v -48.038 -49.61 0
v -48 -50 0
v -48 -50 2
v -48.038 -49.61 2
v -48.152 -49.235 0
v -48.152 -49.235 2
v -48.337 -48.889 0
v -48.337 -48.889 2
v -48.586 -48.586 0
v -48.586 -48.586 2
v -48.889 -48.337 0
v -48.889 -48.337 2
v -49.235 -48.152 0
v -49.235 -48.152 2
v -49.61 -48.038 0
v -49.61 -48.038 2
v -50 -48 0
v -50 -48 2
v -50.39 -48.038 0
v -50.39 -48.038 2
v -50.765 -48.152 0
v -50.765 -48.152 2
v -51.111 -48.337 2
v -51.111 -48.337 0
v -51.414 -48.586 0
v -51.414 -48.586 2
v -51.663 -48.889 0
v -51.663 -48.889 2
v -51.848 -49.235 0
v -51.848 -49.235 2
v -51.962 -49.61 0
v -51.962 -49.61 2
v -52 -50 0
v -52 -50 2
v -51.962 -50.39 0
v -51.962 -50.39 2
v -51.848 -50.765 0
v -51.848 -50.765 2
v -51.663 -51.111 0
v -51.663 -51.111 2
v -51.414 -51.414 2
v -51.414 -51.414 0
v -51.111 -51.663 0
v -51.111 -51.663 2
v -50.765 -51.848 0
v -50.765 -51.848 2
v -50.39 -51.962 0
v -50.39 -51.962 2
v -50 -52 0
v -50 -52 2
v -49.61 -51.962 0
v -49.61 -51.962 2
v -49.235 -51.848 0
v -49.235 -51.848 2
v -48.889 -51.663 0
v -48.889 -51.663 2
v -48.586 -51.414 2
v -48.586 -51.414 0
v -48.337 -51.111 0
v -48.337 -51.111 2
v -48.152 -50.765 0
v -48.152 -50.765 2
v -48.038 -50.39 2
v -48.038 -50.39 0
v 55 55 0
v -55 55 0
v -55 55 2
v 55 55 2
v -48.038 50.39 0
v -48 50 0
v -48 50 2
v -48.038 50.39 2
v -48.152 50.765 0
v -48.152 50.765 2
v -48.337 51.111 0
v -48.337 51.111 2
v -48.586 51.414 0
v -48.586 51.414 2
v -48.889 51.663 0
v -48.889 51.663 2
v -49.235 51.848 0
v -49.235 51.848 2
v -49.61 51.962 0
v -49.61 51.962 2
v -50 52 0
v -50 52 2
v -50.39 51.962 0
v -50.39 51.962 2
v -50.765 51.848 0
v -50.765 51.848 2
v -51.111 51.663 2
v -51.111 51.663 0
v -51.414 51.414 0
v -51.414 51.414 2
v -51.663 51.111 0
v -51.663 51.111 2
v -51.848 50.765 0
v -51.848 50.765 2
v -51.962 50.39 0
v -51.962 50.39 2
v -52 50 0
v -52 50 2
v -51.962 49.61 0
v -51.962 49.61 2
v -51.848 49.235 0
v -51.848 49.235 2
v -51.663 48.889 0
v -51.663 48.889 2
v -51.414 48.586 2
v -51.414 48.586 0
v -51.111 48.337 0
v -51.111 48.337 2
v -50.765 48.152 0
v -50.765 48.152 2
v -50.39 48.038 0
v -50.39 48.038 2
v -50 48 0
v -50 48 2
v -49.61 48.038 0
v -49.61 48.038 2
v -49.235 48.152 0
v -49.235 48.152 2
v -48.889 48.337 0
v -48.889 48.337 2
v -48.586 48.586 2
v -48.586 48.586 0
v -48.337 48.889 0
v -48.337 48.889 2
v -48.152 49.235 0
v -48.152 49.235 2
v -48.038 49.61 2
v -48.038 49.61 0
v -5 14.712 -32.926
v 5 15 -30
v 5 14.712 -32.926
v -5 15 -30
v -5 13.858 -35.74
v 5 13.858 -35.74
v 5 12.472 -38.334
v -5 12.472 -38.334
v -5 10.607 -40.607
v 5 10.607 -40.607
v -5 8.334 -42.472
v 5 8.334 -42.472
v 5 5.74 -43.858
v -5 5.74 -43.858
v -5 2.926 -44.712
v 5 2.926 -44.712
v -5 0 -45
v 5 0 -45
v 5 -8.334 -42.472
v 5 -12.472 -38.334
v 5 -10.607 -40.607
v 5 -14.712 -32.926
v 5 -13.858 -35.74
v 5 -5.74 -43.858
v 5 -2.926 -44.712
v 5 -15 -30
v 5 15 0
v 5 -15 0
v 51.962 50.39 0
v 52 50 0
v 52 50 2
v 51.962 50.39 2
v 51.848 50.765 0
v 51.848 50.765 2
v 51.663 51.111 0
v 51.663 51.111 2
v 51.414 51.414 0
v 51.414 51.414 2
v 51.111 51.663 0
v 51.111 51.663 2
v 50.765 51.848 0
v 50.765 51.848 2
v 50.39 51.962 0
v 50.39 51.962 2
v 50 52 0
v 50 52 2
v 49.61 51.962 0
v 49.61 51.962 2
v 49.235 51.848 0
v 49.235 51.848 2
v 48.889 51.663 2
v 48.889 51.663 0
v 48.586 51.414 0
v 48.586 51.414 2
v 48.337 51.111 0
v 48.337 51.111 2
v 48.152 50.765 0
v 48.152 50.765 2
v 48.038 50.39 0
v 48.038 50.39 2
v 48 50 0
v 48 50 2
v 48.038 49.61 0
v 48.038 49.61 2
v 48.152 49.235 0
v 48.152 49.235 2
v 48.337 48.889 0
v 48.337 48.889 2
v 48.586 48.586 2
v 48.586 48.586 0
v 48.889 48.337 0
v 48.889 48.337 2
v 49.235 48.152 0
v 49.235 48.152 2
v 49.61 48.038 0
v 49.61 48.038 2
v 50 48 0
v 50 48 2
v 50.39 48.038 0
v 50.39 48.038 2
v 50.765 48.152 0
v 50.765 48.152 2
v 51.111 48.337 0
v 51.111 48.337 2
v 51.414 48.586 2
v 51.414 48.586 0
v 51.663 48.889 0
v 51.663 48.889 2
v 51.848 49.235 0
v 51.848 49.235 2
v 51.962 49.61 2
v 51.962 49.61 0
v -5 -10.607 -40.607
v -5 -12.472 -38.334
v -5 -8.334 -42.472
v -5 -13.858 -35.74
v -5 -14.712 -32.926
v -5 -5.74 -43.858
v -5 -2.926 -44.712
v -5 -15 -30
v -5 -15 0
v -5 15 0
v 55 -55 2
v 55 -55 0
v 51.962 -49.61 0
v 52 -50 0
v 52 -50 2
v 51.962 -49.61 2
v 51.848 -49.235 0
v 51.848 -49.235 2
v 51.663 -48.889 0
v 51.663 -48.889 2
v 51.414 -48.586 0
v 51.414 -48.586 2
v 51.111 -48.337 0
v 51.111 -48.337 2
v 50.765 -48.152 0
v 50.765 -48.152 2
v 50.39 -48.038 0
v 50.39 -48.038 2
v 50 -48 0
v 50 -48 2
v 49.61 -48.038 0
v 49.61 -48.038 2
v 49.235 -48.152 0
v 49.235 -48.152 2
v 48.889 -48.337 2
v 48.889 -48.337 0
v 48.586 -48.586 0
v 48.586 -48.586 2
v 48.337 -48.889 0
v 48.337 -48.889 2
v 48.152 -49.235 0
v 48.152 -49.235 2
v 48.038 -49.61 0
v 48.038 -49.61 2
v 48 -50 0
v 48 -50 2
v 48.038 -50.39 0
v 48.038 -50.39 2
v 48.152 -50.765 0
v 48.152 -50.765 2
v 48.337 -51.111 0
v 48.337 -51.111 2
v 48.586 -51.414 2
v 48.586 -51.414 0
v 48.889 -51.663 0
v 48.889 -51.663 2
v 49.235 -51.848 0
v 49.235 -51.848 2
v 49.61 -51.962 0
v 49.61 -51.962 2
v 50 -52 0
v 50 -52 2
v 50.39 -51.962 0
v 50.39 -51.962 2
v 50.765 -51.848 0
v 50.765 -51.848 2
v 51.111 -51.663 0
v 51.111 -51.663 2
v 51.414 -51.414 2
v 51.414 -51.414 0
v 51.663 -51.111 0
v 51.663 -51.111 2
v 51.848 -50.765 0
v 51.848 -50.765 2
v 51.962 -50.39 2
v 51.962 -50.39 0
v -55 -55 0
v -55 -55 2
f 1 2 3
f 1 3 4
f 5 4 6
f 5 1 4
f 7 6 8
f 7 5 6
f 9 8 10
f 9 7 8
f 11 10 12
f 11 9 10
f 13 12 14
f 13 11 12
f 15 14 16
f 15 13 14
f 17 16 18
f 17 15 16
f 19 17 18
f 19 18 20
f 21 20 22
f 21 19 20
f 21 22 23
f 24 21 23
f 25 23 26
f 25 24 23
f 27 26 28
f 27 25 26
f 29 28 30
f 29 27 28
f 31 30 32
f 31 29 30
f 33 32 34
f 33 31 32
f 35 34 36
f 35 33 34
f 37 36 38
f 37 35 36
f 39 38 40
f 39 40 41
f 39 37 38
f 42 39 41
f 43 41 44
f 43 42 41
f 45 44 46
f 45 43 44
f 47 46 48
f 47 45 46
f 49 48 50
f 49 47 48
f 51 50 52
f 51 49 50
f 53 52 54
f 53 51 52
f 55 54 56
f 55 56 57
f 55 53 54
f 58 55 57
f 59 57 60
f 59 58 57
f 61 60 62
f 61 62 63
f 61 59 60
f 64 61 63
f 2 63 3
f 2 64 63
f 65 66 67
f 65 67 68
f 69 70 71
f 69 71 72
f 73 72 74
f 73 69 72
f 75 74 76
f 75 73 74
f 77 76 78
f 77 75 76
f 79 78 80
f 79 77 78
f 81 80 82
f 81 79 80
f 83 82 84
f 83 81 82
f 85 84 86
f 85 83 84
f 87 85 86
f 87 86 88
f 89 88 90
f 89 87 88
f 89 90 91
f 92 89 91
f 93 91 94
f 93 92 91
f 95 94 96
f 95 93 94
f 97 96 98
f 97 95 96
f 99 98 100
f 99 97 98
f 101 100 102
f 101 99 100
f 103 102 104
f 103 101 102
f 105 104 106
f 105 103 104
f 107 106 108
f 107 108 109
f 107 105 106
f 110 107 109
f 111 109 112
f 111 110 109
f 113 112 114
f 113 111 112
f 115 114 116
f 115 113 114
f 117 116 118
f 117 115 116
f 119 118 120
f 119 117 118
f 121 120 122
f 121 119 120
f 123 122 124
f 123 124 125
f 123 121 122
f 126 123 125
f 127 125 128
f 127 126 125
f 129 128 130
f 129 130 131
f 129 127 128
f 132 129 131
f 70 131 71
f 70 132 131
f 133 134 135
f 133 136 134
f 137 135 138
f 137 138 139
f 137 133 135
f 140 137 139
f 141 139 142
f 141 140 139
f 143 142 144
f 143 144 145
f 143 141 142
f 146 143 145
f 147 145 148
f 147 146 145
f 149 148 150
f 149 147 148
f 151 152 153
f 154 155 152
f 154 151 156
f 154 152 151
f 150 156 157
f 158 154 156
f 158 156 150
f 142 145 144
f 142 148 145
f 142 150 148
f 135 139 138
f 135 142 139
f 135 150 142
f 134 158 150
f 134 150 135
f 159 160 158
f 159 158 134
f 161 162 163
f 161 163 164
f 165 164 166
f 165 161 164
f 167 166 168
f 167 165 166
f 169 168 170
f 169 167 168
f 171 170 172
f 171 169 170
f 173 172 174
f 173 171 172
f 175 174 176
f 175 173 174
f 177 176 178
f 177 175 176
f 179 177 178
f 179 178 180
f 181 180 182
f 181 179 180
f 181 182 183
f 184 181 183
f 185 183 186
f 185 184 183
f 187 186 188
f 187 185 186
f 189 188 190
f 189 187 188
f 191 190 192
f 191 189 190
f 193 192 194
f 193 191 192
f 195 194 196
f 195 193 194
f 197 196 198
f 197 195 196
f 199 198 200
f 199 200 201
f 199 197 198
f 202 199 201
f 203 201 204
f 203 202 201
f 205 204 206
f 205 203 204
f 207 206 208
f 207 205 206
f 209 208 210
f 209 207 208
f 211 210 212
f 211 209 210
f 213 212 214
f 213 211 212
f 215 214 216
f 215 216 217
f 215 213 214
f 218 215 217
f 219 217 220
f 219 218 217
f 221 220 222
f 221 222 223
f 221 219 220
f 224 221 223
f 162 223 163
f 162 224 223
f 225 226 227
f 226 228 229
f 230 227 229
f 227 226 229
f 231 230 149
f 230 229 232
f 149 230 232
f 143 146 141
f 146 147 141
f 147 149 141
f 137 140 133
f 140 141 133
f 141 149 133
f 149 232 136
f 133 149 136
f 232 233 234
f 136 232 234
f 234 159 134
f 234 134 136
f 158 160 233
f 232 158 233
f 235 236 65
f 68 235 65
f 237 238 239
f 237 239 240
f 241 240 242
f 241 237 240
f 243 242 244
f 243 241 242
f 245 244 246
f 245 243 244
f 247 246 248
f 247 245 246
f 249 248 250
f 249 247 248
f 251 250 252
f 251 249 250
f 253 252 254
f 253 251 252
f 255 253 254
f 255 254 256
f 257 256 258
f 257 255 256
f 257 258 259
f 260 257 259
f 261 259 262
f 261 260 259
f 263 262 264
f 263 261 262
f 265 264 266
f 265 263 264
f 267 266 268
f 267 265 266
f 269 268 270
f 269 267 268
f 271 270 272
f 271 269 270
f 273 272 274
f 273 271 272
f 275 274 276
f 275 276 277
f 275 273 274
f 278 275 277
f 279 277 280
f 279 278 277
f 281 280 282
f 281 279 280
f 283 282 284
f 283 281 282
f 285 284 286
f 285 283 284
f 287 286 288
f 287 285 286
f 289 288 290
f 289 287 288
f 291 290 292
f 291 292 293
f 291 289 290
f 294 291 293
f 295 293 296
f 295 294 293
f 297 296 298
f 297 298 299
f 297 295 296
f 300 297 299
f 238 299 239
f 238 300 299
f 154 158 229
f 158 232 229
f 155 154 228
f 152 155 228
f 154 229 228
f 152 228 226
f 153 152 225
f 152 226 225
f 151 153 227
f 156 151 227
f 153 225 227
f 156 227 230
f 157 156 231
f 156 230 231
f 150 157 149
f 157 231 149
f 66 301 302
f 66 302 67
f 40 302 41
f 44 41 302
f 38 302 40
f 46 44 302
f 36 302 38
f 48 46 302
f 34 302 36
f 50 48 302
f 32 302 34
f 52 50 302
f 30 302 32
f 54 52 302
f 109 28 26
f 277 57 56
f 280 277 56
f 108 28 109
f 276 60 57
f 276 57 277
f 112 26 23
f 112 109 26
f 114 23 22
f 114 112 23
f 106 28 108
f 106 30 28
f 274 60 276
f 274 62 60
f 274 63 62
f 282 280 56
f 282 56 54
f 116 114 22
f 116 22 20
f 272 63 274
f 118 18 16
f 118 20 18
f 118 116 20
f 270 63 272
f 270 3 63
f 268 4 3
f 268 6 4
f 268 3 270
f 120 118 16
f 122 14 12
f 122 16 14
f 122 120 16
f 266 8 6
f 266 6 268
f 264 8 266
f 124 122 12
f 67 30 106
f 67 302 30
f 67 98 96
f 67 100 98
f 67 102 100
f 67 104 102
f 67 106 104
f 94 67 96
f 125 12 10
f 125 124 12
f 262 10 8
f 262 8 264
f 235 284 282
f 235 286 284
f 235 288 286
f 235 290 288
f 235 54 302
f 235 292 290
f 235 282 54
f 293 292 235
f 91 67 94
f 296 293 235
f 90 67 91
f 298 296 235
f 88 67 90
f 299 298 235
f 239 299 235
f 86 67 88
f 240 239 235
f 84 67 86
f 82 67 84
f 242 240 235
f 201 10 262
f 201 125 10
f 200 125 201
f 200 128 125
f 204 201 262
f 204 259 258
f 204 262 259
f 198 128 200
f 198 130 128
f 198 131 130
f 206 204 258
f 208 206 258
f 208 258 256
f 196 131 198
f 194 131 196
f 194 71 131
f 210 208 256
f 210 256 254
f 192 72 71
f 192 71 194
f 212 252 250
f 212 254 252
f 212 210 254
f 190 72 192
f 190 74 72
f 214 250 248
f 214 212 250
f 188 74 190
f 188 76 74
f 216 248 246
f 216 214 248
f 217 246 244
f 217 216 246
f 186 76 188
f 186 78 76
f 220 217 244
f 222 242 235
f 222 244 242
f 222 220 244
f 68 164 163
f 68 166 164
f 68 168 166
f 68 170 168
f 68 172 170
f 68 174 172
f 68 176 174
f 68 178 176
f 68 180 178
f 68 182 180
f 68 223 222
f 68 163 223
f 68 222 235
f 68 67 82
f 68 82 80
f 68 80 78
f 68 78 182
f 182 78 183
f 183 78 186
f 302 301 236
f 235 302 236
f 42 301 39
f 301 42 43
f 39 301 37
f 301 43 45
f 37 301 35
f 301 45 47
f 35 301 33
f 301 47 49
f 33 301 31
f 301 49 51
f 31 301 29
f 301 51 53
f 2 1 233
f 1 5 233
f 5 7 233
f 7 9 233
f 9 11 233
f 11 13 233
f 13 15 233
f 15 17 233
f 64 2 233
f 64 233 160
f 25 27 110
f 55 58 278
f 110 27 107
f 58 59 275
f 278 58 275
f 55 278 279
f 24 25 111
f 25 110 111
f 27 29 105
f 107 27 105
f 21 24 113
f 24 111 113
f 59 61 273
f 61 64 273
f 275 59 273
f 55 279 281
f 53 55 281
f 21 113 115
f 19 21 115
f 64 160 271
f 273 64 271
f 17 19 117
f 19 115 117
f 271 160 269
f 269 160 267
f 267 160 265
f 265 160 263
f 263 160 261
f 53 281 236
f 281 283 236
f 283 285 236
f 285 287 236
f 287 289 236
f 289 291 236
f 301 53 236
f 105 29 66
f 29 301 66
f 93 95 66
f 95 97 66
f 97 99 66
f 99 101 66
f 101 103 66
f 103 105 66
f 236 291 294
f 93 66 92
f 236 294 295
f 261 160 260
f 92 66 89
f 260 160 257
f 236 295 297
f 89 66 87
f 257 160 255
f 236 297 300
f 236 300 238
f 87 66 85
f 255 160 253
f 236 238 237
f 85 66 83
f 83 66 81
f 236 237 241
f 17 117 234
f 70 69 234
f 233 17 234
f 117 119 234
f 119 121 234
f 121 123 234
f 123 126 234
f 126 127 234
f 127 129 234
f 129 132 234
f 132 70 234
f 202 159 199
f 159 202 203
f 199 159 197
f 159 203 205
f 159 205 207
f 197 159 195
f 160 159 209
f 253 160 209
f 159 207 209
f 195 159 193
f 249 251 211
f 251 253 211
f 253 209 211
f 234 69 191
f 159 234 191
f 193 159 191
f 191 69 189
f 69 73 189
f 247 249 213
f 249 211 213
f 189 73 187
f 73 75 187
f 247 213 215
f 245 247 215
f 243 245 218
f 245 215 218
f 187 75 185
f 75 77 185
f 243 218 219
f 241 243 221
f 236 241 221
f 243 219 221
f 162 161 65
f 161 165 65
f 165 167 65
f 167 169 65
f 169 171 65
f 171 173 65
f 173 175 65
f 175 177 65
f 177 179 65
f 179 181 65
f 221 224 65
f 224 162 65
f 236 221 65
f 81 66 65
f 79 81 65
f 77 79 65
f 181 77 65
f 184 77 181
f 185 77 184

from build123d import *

# Parameters (mm, degrees)
SKETCH1_W           = 110
SKETCH1_H           = 110
SKETCH1_R           = 2
BOSS_EXTRUDE1_DEPTH = 2
SKETCH3_W           = 10
SKETCH3_H           = 30
BOSS_EXTRUDE2_DEPTH = 45
FILLET1_R           = 15


with BuildPart() as part:
    # Sketch1 → Boss-Extrude1 (new body)
    with BuildSketch(Plane.XY):
        Rectangle(SKETCH1_W, SKETCH1_H)
        with Locations((-50, 50)):
            Circle(SKETCH1_R, mode=Mode.SUBTRACT)
        with Locations((-50, -50)):
            Circle(SKETCH1_R, mode=Mode.SUBTRACT)
        with Locations((50, -50)):
            Circle(SKETCH1_R, mode=Mode.SUBTRACT)
        with Locations((50, 50)):
            Circle(SKETCH1_R, mode=Mode.SUBTRACT)
    extrude(amount=BOSS_EXTRUDE1_DEPTH)

    # Sketch3 → Boss-Extrude2 (add)
    with BuildSketch(Plane(origin=(0, 0, 0), x_dir=(-1, 0, 0), z_dir=(0, 0, -1))):
        Rectangle(SKETCH3_W, SKETCH3_H)
    extrude(amount=BOSS_EXTRUDE2_DEPTH)

    # Fillet1
    fillet1_edges = [part.edges().sort_by_distance(p)[0] for p in [
        (0, -15, -45),
        (0, 15, -45),
    ]]
    fillet(fillet1_edges, radius=FILLET1_R - 0.0001)  # a hair under: the kernel refuses the full size


solid = part.part
